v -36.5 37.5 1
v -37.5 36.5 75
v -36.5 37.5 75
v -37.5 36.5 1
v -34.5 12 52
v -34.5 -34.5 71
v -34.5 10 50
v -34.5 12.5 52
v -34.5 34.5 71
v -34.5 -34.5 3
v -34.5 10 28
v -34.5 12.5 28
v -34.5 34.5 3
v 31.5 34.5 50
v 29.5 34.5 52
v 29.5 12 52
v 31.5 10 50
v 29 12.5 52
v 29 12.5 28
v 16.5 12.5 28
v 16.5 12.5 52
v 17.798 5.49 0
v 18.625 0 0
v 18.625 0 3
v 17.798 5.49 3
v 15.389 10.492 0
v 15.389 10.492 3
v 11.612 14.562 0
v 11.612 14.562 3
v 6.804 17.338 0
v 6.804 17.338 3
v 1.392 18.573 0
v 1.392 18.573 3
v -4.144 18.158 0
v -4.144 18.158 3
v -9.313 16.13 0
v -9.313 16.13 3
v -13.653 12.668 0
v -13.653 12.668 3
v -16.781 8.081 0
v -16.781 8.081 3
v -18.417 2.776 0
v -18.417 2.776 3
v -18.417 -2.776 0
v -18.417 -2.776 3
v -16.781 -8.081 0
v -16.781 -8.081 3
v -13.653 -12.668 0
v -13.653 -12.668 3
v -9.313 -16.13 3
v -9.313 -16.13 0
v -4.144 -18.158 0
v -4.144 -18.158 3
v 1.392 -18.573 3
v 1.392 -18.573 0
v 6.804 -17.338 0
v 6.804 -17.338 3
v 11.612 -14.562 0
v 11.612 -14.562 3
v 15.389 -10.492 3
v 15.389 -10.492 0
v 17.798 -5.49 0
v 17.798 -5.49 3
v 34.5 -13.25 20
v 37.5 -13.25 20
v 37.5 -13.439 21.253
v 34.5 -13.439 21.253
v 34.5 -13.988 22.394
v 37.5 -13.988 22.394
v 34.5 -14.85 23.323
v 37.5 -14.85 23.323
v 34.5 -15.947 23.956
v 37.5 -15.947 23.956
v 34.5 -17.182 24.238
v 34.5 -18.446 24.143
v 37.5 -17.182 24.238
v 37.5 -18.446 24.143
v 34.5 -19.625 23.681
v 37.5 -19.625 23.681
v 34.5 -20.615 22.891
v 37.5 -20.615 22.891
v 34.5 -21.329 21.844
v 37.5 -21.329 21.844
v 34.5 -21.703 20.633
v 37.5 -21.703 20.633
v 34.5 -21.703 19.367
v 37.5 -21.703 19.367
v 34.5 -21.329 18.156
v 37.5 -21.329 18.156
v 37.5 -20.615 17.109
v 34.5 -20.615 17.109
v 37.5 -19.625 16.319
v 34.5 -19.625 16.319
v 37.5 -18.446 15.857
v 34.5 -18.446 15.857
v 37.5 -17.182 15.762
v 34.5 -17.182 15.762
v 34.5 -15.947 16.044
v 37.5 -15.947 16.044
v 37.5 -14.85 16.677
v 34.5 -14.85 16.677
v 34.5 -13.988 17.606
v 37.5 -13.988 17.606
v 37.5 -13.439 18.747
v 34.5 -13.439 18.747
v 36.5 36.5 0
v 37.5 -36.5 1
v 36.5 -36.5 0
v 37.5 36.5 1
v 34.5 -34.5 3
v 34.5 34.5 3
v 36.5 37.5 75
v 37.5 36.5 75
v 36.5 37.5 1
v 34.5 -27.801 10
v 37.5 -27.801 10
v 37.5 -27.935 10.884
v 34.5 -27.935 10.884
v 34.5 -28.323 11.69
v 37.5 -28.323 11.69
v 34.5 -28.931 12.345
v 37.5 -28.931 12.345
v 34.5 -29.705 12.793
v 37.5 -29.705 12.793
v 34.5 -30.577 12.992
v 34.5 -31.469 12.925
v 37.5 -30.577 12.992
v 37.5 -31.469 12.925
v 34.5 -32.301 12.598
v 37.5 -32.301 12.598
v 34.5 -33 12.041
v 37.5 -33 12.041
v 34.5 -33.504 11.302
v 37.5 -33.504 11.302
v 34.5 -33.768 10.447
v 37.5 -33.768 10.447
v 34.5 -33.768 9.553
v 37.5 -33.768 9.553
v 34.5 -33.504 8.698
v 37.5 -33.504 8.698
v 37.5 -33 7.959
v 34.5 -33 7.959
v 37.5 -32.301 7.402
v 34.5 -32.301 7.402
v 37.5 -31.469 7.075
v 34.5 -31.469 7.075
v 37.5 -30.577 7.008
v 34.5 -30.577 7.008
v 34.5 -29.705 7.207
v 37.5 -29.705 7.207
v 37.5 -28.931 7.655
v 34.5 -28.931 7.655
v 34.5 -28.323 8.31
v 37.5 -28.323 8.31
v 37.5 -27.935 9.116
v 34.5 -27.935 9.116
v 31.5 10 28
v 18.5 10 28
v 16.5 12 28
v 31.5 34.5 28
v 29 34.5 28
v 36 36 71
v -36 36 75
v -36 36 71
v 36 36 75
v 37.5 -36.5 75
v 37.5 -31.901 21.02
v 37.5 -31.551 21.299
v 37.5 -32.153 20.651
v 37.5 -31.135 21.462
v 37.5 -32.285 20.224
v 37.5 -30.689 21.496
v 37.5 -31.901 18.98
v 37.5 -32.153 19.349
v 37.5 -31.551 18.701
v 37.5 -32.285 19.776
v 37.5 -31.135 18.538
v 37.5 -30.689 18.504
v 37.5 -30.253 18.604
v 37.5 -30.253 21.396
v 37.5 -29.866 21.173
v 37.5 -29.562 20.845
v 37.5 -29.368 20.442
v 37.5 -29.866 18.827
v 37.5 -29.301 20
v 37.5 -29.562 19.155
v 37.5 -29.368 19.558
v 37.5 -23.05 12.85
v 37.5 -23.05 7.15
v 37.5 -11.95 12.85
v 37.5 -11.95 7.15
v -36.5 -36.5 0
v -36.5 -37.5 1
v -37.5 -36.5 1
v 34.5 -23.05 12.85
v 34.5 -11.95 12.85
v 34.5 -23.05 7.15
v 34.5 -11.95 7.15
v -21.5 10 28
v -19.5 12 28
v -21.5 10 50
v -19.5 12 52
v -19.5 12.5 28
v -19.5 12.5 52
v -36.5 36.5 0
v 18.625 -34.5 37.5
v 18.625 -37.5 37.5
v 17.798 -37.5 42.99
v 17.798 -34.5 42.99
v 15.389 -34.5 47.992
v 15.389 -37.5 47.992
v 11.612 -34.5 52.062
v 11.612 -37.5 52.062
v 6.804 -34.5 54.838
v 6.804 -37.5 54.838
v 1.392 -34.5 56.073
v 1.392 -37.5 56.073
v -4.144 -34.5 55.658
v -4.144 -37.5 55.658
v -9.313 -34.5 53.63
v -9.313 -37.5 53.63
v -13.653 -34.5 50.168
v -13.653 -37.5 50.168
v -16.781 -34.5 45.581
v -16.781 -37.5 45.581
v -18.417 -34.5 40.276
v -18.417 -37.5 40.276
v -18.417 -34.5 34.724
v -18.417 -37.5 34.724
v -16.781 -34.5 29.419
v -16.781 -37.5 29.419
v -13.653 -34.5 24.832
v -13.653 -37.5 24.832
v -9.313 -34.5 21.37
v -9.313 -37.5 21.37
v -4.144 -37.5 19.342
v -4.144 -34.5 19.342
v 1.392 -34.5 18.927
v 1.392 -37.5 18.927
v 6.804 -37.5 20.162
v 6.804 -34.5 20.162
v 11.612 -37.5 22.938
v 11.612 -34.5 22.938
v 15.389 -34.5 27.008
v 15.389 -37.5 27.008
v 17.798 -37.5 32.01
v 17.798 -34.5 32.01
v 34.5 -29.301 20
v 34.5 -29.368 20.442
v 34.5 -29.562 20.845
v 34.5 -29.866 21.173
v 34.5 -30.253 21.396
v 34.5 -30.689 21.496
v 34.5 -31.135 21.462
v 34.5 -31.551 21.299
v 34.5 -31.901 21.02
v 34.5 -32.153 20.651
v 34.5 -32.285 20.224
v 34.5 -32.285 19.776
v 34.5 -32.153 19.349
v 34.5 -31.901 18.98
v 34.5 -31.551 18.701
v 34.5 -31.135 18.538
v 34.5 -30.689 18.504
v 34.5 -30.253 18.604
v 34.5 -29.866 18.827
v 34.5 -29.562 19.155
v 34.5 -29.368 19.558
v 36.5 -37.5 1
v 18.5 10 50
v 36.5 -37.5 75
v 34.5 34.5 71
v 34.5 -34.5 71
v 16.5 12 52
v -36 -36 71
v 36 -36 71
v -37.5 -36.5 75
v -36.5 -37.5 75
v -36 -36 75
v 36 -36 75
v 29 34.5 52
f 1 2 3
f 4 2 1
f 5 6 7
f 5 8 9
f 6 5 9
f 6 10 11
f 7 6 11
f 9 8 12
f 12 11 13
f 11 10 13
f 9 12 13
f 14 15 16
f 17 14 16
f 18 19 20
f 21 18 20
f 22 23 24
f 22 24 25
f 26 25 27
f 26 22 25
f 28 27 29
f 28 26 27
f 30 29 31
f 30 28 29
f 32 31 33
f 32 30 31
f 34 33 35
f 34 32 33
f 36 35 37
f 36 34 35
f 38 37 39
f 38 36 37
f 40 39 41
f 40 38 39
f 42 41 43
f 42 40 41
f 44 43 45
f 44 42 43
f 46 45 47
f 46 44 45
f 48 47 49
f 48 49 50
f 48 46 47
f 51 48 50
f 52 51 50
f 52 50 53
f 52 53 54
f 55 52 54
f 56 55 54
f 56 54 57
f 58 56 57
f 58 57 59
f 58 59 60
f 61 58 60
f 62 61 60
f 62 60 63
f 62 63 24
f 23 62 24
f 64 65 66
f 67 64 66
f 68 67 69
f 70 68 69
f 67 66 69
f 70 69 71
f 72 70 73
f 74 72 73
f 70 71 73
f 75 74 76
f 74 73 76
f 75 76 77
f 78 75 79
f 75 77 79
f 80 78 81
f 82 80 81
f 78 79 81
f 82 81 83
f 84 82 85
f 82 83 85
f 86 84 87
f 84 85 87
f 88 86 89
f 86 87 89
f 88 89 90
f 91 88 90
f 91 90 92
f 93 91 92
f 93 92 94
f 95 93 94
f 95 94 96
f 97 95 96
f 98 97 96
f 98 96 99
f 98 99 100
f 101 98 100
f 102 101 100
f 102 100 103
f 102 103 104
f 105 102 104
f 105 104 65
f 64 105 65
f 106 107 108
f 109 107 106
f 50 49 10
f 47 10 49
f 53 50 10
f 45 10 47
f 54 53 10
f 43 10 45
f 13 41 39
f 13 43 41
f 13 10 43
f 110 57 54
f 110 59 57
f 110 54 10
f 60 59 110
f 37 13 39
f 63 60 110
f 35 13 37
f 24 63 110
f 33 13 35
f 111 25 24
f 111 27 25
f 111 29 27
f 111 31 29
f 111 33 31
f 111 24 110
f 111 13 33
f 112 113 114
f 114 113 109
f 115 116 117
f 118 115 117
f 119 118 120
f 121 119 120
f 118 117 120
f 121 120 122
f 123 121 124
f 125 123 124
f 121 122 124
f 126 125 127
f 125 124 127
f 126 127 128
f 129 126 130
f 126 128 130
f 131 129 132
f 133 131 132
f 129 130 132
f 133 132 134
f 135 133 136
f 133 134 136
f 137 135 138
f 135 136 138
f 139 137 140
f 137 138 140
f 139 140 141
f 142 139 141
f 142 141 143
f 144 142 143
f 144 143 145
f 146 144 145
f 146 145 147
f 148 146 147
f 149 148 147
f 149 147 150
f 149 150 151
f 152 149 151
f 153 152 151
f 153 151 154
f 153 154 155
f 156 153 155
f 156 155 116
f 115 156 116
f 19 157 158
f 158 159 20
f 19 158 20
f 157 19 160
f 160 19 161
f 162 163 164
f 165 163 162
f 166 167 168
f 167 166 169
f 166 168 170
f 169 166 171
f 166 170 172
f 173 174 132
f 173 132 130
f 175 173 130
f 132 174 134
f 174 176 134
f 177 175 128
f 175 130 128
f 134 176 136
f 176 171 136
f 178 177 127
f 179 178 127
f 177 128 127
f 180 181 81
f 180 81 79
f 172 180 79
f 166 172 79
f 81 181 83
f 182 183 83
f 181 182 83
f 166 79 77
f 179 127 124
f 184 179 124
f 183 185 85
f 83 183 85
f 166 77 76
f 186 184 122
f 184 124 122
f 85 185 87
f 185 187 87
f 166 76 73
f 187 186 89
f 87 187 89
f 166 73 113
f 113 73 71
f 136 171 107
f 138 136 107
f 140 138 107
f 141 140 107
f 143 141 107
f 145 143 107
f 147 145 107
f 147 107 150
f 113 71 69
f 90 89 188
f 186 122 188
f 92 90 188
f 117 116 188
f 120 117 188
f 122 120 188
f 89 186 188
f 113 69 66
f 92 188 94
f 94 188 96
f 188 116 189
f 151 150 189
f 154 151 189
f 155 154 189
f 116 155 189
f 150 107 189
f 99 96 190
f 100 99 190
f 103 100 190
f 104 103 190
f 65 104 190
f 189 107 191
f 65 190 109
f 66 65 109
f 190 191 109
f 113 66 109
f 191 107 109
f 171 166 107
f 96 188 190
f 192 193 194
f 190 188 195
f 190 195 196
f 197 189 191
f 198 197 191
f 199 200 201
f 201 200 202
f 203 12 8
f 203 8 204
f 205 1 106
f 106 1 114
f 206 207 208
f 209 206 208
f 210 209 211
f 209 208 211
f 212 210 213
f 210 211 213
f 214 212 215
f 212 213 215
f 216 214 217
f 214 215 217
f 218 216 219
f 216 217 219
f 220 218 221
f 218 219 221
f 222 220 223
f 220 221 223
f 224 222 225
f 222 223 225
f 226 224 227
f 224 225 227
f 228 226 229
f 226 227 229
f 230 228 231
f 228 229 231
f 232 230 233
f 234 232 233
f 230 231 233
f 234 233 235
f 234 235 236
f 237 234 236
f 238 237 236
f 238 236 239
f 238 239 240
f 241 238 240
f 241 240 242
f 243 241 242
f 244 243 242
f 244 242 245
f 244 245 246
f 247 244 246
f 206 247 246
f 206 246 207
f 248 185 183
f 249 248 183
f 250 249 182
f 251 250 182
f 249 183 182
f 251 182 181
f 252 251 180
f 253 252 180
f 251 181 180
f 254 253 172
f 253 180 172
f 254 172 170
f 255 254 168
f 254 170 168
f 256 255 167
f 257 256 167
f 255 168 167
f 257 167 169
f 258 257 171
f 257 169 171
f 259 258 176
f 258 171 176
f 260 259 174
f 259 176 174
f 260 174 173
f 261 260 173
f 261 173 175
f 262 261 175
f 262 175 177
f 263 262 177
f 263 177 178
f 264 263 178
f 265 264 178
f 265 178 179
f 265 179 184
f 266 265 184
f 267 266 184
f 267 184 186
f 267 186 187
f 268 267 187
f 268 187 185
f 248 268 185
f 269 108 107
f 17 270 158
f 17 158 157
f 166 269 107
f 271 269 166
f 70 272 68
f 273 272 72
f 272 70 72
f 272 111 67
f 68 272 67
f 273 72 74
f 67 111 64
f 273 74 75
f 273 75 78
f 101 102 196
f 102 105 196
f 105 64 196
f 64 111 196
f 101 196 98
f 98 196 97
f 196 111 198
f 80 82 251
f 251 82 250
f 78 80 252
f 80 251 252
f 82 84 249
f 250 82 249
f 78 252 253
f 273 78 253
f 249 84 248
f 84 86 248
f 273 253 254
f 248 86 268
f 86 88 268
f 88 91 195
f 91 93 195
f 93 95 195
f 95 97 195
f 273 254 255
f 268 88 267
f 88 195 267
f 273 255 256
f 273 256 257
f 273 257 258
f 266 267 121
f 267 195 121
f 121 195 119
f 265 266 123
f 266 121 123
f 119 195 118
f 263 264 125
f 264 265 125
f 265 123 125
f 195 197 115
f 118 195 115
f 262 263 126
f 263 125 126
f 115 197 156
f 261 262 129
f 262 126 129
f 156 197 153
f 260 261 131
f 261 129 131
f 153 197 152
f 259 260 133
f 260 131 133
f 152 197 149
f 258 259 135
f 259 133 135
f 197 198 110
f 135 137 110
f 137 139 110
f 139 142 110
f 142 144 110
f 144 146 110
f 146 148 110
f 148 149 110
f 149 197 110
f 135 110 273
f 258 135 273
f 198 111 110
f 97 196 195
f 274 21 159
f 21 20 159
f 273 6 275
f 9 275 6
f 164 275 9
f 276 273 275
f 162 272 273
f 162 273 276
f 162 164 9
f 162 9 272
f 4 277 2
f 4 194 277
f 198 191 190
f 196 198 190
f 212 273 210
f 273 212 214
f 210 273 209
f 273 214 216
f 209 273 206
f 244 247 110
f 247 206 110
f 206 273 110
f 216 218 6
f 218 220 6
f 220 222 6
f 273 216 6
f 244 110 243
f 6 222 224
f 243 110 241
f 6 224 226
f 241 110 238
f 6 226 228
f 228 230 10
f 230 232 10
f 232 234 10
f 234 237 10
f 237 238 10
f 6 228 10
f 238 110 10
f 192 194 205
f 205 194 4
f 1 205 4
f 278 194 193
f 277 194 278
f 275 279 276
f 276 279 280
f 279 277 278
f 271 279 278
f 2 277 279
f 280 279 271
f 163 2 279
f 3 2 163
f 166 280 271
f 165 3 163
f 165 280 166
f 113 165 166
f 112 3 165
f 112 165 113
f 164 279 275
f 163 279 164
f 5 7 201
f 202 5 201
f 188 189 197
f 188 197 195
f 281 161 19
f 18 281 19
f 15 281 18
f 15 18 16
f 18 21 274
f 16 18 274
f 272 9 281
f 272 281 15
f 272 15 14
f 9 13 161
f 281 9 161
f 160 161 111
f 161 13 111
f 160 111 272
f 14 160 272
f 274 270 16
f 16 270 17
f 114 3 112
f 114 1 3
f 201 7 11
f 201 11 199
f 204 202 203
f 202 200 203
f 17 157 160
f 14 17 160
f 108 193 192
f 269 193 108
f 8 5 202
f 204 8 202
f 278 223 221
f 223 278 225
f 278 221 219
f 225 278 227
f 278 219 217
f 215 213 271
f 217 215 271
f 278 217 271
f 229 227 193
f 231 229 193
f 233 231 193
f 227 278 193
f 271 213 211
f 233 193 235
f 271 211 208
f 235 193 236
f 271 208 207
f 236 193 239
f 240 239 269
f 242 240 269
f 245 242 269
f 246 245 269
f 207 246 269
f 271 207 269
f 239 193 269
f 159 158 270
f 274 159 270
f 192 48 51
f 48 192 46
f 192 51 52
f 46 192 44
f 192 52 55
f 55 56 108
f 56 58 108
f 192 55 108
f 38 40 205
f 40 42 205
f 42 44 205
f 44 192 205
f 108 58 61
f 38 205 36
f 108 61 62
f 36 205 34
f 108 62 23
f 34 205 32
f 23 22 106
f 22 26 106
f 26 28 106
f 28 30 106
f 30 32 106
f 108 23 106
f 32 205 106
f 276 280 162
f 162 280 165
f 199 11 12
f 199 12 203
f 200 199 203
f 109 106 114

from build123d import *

# Parameters (mm, degrees)
F0_W           = 75
F0_H           = 75
F0_R           = 18.625
F1_DEPTH       = 3
F2_DEPTH       = 75
F3_R           = 18.625
F4_DEPTH       = 10.2
F0_W_2         = 15
F0_H_2         = 2.5
F5_DEPTH       = 77
F6_W           = 72
F6_H           = 72
F7_DEPTH       = 4
F8_SIZE        = 1
F10_W          = 12.5
F10_H          = 25
F11_DEPTH      = 25
F9_W           = 15
F9_H           = 25
F12_DEPTH      = 14.8
F14_DEPTH      = 3.8
F15_R          = 1.5
F15_R_2        = 4.25
F15_W          = 11.1
F15_H          = 5.7
F15_R_3        = 3
F16_DEPTH      = 25
F16_DEPTH_BACK = 25
F17_SIZE2      = 2
F17_SIZE       = 2


# Not quite as in the source:
# - a feature names something its author has since deleted; it is built from what else it names


with BuildPart() as f1:
    # F0 (on Top) → F1 (new body)
    with BuildSketch(Plane.XY):
        Rectangle(F0_W, F0_H)
        Polygon((-34.5, 12.5), (-34.5, 34.5), (29, 34.5), (31.5, 34.5), (34.5, 34.5), (34.5, -34.5), (-34.5, -34.5), (-34.5, 10), align=None, mode=Mode.SUBTRACT)
        Polygon((29, 34.5), (-34.5, 34.5), (-34.5, 12.5), (-19.5, 12.5), (-19.5, 10), (-34.5, 10), (-34.5, -34.5), (34.5, -34.5), (34.5, 34.5), (31.5, 34.5), (31.5, 10), (16.5, 10), (16.5, 12.5), (29, 12.5), align=None)
        Circle(F0_R, mode=Mode.SUBTRACT)
    extrude(amount=F1_DEPTH)

    # F0 (on Top) → F2 (join)
    with BuildSketch(Plane.XY):
        Rectangle(F0_W, F0_H)
        Polygon((-34.5, 12.5), (-34.5, 34.5), (29, 34.5), (31.5, 34.5), (34.5, 34.5), (34.5, -34.5), (-34.5, -34.5), (-34.5, 10), align=None, mode=Mode.SUBTRACT)
    extrude(amount=F2_DEPTH)

    # F3 (on face) → F4 (cut)
    with BuildSketch(Plane.XZ.offset(37.5)):
        with Locations((0, 37.5)):
            Circle(F3_R)
    extrude(amount=-F4_DEPTH, mode=Mode.SUBTRACT)

    # F0 (on Top) → F5 (join)
    with BuildSketch(Plane.XY):
        with Locations((-27, 11.25)):
            Rectangle(F0_W_2, F0_H_2)
        Polygon((31.5, 34.5), (29, 34.5), (29, 12.5), (16.5, 12.5), (16.5, 10), (31.5, 10), align=None)
    extrude(amount=F5_DEPTH)

    # F6 (on face) → F7 (cut)
    with BuildSketch(Plane.XY.offset(75)):
        Rectangle(F6_W, F6_H)
        Polygon((-34.5, 10), (-34.5, 12.5), (-34.5, 34.5), (29, 34.5), (31.5, 34.5), (34.5, 34.5), (34.5, -34.5), (-34.5, -34.5), align=None, mode=Mode.SUBTRACT)
    extrude(amount=-F7_DEPTH, mode=Mode.SUBTRACT)

    # F8
    f8_edges = [f1.edges().sort_by_distance(p)[0] for p in [
        (37.5, 0, 0),
        (0, -37.5, 0),
        (-37.5, -37.5, 37.5),
        (37.5, -37.5, 37.5),
        (-37.5, 0, 0),
        (0, 37.5, 0),
        (37.5, 37.5, 37.5),
        (-37.5, 37.5, 37.5),
    ]]
    chamfer(f8_edges, length=F8_SIZE)

    # F10 (on face) → F11 (cut)
    with BuildSketch(Plane(origin=(0, 12.5, 0), x_dir=(-1, 0, 0), z_dir=(0, 1, 0))):
        with Locations((-22.75, 64.5)):
            Rectangle(F10_W, F10_H)
        with Locations((-22.75, 15.5)):
            Rectangle(F10_W, F10_H)
    extrude(amount=-F11_DEPTH, mode=Mode.SUBTRACT)

    # F9 (on face) → F12 (cut)
    with BuildSketch(Plane.XZ.offset(-10)):
        Polygon((-19.5, 77), (-34.5, 77), (-34.5, 71), (-34.5, 52), (-19.5, 52), align=None)
        with Locations((-27, 15.5)):
            Rectangle(F9_W, F9_H)
    extrude(amount=-F12_DEPTH, mode=Mode.SUBTRACT)

    # F13 (on face) → F14 (cut)
    with BuildSketch(Plane(origin=(29, 0, 0), x_dir=(0, -1, 0), z_dir=(-1, 0, 0))):
        Polygon((-12.5, 52), (-10, 52), (-10, 77), (-34.5, 77), (-34.5, 71), (-34.5, 52), align=None)
        Polygon((-10, 28), (-12.5, 28), (-34.5, 28), (-34.5, 3), (-10, 3), align=None)
    extrude(amount=-F14_DEPTH, mode=Mode.SUBTRACT)

    # F15 (on face) → F16 (cut, two sides)
    with BuildSketch(Plane.YZ.offset(37.5)) as f16_sk:
        with Locations((-30.8012962341, 20)):
            Circle(F15_R)
        with Locations((-17.5, 20)):
            Circle(F15_R_2)
        with Locations((-17.5, 10)):
            Rectangle(F15_W, F15_H)
        with Locations((-30.8012962341, 10)):
            Circle(F15_R_3)
    extrude(amount=-F16_DEPTH, mode=Mode.SUBTRACT)
    extrude(f16_sk.sketch, amount=F16_DEPTH_BACK, mode=Mode.SUBTRACT)

    # F17
    f17_edges = [f1.edges().sort_by_distance(p)[0] for p in [
        (16.5, 10, 40),
        (24, 10, 52),
        (-27, 10, 52),
        (-19.5, 10, 40),
        (31.5, 22.25, 52),
    ]]
    chamfer(f17_edges, length=F17_SIZE, length2=F17_SIZE2)


solid = f1.part
